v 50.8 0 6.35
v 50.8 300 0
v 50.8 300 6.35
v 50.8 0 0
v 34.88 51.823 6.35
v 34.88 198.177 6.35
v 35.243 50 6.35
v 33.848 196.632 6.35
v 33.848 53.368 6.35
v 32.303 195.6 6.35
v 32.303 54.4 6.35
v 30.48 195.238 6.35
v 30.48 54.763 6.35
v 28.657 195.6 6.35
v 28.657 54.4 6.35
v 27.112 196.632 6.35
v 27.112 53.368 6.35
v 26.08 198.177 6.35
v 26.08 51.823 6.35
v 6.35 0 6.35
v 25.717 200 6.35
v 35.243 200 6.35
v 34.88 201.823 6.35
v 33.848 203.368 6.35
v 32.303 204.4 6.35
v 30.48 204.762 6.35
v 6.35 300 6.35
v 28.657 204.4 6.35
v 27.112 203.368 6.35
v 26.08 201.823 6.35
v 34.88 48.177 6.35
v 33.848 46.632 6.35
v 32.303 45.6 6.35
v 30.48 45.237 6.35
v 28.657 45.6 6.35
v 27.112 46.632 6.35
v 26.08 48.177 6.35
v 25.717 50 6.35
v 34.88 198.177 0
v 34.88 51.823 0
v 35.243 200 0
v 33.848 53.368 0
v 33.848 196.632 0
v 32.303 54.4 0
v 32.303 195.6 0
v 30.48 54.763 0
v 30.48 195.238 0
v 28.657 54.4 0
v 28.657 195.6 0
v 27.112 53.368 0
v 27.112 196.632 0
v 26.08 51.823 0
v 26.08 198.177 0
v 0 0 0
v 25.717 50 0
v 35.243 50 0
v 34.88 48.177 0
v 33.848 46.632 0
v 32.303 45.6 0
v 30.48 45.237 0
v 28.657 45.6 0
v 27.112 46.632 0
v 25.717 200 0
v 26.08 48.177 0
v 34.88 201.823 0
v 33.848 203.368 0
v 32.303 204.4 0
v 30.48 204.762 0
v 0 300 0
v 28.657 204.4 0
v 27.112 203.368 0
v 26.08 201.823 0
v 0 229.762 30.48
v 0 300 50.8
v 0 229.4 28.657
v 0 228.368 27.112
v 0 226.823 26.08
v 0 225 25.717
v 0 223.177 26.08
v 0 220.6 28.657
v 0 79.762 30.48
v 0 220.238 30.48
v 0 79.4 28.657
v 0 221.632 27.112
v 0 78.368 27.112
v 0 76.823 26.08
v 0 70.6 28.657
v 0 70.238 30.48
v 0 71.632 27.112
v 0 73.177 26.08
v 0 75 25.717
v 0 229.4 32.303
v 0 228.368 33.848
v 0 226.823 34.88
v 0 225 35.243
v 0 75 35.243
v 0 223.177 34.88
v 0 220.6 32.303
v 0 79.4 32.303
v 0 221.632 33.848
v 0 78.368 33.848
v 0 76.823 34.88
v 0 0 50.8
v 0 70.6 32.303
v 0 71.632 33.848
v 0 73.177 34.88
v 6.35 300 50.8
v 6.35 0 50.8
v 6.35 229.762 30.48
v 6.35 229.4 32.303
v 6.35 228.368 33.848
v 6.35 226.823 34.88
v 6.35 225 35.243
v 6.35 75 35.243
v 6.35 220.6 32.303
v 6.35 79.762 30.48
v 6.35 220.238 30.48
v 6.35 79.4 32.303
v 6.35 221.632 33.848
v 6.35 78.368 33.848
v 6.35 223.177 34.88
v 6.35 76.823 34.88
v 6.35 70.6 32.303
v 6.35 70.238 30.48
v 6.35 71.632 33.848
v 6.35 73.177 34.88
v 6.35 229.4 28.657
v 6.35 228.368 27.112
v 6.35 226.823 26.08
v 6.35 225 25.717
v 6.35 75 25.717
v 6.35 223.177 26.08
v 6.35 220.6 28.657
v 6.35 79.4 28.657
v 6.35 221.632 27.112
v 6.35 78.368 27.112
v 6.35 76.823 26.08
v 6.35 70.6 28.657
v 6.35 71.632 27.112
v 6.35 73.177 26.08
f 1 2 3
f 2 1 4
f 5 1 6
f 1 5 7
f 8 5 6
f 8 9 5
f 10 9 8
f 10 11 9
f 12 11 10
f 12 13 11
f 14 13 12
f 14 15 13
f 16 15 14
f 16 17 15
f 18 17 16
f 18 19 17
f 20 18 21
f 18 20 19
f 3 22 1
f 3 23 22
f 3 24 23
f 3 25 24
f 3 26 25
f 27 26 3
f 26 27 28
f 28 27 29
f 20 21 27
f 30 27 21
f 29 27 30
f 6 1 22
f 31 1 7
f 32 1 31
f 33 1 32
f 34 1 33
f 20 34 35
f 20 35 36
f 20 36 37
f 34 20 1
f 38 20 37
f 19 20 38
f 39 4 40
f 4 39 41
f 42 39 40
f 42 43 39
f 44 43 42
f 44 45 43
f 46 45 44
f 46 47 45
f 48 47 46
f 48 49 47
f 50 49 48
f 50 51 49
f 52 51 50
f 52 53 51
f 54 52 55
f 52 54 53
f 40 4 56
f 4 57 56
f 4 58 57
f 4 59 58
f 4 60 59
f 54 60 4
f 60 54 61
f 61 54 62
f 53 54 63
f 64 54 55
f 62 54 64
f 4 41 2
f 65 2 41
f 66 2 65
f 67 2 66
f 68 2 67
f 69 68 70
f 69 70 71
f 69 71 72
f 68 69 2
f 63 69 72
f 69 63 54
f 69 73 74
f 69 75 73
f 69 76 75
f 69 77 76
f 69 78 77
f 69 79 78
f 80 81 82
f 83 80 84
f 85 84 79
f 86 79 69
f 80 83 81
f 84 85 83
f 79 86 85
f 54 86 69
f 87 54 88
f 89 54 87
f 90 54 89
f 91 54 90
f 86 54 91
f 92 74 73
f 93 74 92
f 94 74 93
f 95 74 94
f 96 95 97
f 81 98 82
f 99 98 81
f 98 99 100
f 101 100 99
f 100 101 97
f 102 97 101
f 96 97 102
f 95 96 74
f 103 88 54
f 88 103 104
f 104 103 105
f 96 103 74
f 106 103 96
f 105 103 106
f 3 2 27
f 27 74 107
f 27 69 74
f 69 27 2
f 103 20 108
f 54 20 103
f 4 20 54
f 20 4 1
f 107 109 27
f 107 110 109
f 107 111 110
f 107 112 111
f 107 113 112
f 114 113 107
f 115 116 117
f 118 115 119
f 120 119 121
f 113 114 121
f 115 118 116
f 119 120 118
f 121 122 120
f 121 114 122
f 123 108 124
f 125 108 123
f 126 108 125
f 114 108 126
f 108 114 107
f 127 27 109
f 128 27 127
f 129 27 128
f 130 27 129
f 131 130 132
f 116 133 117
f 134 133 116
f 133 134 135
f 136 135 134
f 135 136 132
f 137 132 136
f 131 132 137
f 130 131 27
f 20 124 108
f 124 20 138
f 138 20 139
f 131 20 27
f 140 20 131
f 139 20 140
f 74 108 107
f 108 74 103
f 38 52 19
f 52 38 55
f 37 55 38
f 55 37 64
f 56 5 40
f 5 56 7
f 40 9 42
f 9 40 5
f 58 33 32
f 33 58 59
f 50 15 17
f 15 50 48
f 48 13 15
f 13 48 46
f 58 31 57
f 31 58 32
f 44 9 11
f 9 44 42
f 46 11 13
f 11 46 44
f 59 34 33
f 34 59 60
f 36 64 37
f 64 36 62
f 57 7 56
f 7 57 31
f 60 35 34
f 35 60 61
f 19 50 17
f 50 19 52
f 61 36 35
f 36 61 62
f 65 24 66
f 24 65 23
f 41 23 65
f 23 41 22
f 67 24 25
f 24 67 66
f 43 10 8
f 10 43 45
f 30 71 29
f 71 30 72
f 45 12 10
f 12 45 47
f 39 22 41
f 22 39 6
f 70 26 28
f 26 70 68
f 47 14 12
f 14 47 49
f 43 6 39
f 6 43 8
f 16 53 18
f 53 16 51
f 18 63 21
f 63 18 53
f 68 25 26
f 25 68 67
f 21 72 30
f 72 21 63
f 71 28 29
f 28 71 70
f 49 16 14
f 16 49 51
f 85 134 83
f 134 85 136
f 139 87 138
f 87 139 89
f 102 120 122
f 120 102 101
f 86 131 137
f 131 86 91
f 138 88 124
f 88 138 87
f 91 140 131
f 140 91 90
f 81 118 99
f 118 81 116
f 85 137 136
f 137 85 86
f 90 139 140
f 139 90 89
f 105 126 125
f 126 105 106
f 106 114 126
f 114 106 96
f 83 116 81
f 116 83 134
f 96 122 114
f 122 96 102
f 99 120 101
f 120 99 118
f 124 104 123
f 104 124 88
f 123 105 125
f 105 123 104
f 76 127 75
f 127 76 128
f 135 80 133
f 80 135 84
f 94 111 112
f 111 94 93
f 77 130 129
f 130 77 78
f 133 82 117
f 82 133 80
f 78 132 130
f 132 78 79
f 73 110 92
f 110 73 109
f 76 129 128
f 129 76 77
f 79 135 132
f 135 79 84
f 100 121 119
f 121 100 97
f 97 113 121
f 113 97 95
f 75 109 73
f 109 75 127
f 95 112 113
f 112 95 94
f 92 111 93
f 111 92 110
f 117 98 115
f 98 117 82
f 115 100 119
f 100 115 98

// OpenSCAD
// Part A6: Bottom Stiffener Plate - Horizontal Angle Iron (Full Assembly Module)
// Material: 2"×2"×1/4" Angle Iron (50.8mm × 6.35mm)
// Quantity: 24 total pieces (6 locations × 3 segments + motor plate segments)
// Location: Bottom stiffener plate, all four wall panel faces
//
// This is a HORIZONTAL angle iron that runs along the Y axis (forward/backward).
// It sits on top of the bottom plate with:
//   - Horizontal leg flat ON the plate surface (extends toward center)
//   - Vertical leg going UP against the wall panel
//
// NOTE: Due to wheel clearance requirements, each run is split into 3 segments
// with 8" (203.2mm) gaps centered on each wheel axis.

include <../../lifetrac_v25_params.scad>

// =============================================================================
// SEGMENT LENGTH CALCULATIONS
// =============================================================================

// These values match lifetrac_v25.scad calculations
// The actual lengths are calculated from wheel positions in the main assembly

// Default segment lengths (actual values come from params at render time)
// Segment 1: Rear section (from plate start to rear wheel gap)
// Segment 2: Middle section (between wheel gaps)
// Segment 3: Front section (from front wheel gap to plate end)

PART_A6_LEG = 50.8;       // 2" leg
PART_A6_THICK = 6.35;     // 1/4" thickness
PART_A6_BOLT_DIA = 9.525; // 3/8" bolts
PART_A6_HOLE_OFFSET = PART_A6_LEG * 0.6;

// =============================================================================
// HOLE PATTERN FUNCTIONS
// =============================================================================

// Horizontal leg holes (bolts go through in Z direction - into plate)
function get_horizontal_holes_a(length) = 
    let(
        start_offset = 50,
        end_offset = 50,
        spacing = 150,
        count = max(1, floor((length - start_offset - end_offset) / spacing) + 1)
    )
    [for (i = [0:count-1]) start_offset + i * spacing];

// Vertical leg holes (bolts go through in X direction - into wall)
function get_horizontal_holes_b(length) = 
    let(
        start_offset = 75,
        end_offset = 50,
        spacing = 150,
        count = max(1, floor((length - start_offset - end_offset) / spacing) + 1)
    )
    [for (i = [0:count-1]) start_offset + i * spacing];

// =============================================================================
// SINGLE SEGMENT MODULE
// =============================================================================

/**
 * Creates a single horizontal angle iron segment
 * 
 * Orientation:
 *   - Runs along Y axis (length)
 *   - Origin at corner [0, 0, 0]
 *   - Horizontal leg extends in +X direction (toward center, flat on plate)
 *   - Vertical leg extends in +Z direction (up against wall)
 *
 * @param length Length of this segment
 * @param show_holes If true, drill bolt holes
 */
module _bottom_angle_segment(length, show_holes=true) {
    leg = PART_A6_LEG;
    thick = PART_A6_THICK;
    bolt_dia = PART_A6_BOLT_DIA;
    hole_offset = PART_A6_HOLE_OFFSET;
    
    if (length > 0) {
        color("DarkGray")
        difference() {
            union() {
                // Horizontal leg - flat on plate, extends in +X direction
                cube([leg, length, thick]);
                // Vertical leg - extends upward in +Z direction
                cube([thick, length, leg]);
            }
            
            if (show_holes) {
                // Holes on horizontal leg (bolts go through in Z direction)
                for (y = get_horizontal_holes_a(length)) {
                    translate([hole_offset, y, thick/2])
                    cylinder(d=bolt_dia, h=thick+2, center=true, $fn=16);
                }
                
                // Holes on vertical leg (bolts go through in X direction)
                for (y = get_horizontal_holes_b(length)) {
                    translate([thick/2, y, hole_offset])
                    rotate([0, 90, 0])
                    cylinder(d=bolt_dia, h=thick+2, center=true, $fn=16);
                }
            }
        }
    }
}

// =============================================================================
// INDIVIDUAL SEGMENT PARTS (for fabrication)
// =============================================================================

// Segment 1 (Rear) - from plate start to rear wheel gap
module _part_a6_bottom_segment_1(show_holes=true) {
    // Use the calculated segment length from params
    _seg1_len = is_undef(ANGLE_SEGMENT_1_LENGTH) ? 200 : ANGLE_SEGMENT_1_LENGTH;
    _bottom_angle_segment(_seg1_len, show_holes);
}

// Segment 2 (Middle) - between wheel gaps
module _part_a6_bottom_segment_2(show_holes=true) {
    _seg2_len = is_undef(ANGLE_SEGMENT_2_LENGTH) ? 300 : ANGLE_SEGMENT_2_LENGTH;
    _bottom_angle_segment(_seg2_len, show_holes);
}

// Segment 3 (Front) - from front wheel gap to plate end
module _part_a6_bottom_segment_3(show_holes=true) {
    _seg3_len = is_undef(ANGLE_SEGMENT_3_LENGTH) ? 250 : ANGLE_SEGMENT_3_LENGTH;
    _bottom_angle_segment(_seg3_len, show_holes);
}

// =============================================================================
// COMPLETE SPLIT ASSEMBLY (for visualization)
// =============================================================================

/**
 * Creates all 3 segments in their correct positions
 * Matches the split_horizontal_angle_iron module in lifetrac_v25.scad
 */
module _part_a6_split_horizontal_angle_iron(show_holes=true) {
    _gap = is_undef(ANGLE_IRON_GAP) ? 203.2 : ANGLE_IRON_GAP;  // 8" gap
    
    _seg1_len = is_undef(ANGLE_SEGMENT_1_LENGTH) ? 200 : ANGLE_SEGMENT_1_LENGTH;
    _seg2_len = is_undef(ANGLE_SEGMENT_2_LENGTH) ? 300 : ANGLE_SEGMENT_2_LENGTH;
    _seg3_len = is_undef(ANGLE_SEGMENT_3_LENGTH) ? 250 : ANGLE_SEGMENT_3_LENGTH;
    
    _seg1_start = is_undef(ANGLE_SEGMENT_1_START) ? 0 : ANGLE_SEGMENT_1_START;
    _seg2_start = is_undef(ANGLE_SEGMENT_2_START) ? _seg1_len + _gap : ANGLE_SEGMENT_2_START;
    _seg3_start = is_undef(ANGLE_SEGMENT_3_START) ? _seg2_start + _seg2_len + _gap : ANGLE_SEGMENT_3_START;
    
    // Segment 1 (rear)
    translate([0, _seg1_start, 0])
    _bottom_angle_segment(_seg1_len, show_holes);
    
    // Segment 2 (middle)
    translate([0, _seg2_start, 0])
    _bottom_angle_segment(_seg2_len, show_holes);
    
    // Segment 3 (front)
    translate([0, _seg3_start, 0])
    _bottom_angle_segment(_seg3_len, show_holes);
}

// =============================================================================
// RENDER
// =============================================================================

// Show segment 2 (middle, typically the longest) for preview
_part_a6_bottom_segment_2(show_holes=true);

echo("=== PART A6: Bottom Stiffener Horizontal Angle (Split) ===");
echo("Total unique segments: 3 per run");
echo("Total runs: 8 (4 walls × outer + inner sides)");
echo("Total segment pieces: 24");
echo("Leg size:", PART_A6_LEG, "mm (2\")");
echo("Bolt diameter:", PART_A6_BOLT_DIA, "mm (3/8\")");
